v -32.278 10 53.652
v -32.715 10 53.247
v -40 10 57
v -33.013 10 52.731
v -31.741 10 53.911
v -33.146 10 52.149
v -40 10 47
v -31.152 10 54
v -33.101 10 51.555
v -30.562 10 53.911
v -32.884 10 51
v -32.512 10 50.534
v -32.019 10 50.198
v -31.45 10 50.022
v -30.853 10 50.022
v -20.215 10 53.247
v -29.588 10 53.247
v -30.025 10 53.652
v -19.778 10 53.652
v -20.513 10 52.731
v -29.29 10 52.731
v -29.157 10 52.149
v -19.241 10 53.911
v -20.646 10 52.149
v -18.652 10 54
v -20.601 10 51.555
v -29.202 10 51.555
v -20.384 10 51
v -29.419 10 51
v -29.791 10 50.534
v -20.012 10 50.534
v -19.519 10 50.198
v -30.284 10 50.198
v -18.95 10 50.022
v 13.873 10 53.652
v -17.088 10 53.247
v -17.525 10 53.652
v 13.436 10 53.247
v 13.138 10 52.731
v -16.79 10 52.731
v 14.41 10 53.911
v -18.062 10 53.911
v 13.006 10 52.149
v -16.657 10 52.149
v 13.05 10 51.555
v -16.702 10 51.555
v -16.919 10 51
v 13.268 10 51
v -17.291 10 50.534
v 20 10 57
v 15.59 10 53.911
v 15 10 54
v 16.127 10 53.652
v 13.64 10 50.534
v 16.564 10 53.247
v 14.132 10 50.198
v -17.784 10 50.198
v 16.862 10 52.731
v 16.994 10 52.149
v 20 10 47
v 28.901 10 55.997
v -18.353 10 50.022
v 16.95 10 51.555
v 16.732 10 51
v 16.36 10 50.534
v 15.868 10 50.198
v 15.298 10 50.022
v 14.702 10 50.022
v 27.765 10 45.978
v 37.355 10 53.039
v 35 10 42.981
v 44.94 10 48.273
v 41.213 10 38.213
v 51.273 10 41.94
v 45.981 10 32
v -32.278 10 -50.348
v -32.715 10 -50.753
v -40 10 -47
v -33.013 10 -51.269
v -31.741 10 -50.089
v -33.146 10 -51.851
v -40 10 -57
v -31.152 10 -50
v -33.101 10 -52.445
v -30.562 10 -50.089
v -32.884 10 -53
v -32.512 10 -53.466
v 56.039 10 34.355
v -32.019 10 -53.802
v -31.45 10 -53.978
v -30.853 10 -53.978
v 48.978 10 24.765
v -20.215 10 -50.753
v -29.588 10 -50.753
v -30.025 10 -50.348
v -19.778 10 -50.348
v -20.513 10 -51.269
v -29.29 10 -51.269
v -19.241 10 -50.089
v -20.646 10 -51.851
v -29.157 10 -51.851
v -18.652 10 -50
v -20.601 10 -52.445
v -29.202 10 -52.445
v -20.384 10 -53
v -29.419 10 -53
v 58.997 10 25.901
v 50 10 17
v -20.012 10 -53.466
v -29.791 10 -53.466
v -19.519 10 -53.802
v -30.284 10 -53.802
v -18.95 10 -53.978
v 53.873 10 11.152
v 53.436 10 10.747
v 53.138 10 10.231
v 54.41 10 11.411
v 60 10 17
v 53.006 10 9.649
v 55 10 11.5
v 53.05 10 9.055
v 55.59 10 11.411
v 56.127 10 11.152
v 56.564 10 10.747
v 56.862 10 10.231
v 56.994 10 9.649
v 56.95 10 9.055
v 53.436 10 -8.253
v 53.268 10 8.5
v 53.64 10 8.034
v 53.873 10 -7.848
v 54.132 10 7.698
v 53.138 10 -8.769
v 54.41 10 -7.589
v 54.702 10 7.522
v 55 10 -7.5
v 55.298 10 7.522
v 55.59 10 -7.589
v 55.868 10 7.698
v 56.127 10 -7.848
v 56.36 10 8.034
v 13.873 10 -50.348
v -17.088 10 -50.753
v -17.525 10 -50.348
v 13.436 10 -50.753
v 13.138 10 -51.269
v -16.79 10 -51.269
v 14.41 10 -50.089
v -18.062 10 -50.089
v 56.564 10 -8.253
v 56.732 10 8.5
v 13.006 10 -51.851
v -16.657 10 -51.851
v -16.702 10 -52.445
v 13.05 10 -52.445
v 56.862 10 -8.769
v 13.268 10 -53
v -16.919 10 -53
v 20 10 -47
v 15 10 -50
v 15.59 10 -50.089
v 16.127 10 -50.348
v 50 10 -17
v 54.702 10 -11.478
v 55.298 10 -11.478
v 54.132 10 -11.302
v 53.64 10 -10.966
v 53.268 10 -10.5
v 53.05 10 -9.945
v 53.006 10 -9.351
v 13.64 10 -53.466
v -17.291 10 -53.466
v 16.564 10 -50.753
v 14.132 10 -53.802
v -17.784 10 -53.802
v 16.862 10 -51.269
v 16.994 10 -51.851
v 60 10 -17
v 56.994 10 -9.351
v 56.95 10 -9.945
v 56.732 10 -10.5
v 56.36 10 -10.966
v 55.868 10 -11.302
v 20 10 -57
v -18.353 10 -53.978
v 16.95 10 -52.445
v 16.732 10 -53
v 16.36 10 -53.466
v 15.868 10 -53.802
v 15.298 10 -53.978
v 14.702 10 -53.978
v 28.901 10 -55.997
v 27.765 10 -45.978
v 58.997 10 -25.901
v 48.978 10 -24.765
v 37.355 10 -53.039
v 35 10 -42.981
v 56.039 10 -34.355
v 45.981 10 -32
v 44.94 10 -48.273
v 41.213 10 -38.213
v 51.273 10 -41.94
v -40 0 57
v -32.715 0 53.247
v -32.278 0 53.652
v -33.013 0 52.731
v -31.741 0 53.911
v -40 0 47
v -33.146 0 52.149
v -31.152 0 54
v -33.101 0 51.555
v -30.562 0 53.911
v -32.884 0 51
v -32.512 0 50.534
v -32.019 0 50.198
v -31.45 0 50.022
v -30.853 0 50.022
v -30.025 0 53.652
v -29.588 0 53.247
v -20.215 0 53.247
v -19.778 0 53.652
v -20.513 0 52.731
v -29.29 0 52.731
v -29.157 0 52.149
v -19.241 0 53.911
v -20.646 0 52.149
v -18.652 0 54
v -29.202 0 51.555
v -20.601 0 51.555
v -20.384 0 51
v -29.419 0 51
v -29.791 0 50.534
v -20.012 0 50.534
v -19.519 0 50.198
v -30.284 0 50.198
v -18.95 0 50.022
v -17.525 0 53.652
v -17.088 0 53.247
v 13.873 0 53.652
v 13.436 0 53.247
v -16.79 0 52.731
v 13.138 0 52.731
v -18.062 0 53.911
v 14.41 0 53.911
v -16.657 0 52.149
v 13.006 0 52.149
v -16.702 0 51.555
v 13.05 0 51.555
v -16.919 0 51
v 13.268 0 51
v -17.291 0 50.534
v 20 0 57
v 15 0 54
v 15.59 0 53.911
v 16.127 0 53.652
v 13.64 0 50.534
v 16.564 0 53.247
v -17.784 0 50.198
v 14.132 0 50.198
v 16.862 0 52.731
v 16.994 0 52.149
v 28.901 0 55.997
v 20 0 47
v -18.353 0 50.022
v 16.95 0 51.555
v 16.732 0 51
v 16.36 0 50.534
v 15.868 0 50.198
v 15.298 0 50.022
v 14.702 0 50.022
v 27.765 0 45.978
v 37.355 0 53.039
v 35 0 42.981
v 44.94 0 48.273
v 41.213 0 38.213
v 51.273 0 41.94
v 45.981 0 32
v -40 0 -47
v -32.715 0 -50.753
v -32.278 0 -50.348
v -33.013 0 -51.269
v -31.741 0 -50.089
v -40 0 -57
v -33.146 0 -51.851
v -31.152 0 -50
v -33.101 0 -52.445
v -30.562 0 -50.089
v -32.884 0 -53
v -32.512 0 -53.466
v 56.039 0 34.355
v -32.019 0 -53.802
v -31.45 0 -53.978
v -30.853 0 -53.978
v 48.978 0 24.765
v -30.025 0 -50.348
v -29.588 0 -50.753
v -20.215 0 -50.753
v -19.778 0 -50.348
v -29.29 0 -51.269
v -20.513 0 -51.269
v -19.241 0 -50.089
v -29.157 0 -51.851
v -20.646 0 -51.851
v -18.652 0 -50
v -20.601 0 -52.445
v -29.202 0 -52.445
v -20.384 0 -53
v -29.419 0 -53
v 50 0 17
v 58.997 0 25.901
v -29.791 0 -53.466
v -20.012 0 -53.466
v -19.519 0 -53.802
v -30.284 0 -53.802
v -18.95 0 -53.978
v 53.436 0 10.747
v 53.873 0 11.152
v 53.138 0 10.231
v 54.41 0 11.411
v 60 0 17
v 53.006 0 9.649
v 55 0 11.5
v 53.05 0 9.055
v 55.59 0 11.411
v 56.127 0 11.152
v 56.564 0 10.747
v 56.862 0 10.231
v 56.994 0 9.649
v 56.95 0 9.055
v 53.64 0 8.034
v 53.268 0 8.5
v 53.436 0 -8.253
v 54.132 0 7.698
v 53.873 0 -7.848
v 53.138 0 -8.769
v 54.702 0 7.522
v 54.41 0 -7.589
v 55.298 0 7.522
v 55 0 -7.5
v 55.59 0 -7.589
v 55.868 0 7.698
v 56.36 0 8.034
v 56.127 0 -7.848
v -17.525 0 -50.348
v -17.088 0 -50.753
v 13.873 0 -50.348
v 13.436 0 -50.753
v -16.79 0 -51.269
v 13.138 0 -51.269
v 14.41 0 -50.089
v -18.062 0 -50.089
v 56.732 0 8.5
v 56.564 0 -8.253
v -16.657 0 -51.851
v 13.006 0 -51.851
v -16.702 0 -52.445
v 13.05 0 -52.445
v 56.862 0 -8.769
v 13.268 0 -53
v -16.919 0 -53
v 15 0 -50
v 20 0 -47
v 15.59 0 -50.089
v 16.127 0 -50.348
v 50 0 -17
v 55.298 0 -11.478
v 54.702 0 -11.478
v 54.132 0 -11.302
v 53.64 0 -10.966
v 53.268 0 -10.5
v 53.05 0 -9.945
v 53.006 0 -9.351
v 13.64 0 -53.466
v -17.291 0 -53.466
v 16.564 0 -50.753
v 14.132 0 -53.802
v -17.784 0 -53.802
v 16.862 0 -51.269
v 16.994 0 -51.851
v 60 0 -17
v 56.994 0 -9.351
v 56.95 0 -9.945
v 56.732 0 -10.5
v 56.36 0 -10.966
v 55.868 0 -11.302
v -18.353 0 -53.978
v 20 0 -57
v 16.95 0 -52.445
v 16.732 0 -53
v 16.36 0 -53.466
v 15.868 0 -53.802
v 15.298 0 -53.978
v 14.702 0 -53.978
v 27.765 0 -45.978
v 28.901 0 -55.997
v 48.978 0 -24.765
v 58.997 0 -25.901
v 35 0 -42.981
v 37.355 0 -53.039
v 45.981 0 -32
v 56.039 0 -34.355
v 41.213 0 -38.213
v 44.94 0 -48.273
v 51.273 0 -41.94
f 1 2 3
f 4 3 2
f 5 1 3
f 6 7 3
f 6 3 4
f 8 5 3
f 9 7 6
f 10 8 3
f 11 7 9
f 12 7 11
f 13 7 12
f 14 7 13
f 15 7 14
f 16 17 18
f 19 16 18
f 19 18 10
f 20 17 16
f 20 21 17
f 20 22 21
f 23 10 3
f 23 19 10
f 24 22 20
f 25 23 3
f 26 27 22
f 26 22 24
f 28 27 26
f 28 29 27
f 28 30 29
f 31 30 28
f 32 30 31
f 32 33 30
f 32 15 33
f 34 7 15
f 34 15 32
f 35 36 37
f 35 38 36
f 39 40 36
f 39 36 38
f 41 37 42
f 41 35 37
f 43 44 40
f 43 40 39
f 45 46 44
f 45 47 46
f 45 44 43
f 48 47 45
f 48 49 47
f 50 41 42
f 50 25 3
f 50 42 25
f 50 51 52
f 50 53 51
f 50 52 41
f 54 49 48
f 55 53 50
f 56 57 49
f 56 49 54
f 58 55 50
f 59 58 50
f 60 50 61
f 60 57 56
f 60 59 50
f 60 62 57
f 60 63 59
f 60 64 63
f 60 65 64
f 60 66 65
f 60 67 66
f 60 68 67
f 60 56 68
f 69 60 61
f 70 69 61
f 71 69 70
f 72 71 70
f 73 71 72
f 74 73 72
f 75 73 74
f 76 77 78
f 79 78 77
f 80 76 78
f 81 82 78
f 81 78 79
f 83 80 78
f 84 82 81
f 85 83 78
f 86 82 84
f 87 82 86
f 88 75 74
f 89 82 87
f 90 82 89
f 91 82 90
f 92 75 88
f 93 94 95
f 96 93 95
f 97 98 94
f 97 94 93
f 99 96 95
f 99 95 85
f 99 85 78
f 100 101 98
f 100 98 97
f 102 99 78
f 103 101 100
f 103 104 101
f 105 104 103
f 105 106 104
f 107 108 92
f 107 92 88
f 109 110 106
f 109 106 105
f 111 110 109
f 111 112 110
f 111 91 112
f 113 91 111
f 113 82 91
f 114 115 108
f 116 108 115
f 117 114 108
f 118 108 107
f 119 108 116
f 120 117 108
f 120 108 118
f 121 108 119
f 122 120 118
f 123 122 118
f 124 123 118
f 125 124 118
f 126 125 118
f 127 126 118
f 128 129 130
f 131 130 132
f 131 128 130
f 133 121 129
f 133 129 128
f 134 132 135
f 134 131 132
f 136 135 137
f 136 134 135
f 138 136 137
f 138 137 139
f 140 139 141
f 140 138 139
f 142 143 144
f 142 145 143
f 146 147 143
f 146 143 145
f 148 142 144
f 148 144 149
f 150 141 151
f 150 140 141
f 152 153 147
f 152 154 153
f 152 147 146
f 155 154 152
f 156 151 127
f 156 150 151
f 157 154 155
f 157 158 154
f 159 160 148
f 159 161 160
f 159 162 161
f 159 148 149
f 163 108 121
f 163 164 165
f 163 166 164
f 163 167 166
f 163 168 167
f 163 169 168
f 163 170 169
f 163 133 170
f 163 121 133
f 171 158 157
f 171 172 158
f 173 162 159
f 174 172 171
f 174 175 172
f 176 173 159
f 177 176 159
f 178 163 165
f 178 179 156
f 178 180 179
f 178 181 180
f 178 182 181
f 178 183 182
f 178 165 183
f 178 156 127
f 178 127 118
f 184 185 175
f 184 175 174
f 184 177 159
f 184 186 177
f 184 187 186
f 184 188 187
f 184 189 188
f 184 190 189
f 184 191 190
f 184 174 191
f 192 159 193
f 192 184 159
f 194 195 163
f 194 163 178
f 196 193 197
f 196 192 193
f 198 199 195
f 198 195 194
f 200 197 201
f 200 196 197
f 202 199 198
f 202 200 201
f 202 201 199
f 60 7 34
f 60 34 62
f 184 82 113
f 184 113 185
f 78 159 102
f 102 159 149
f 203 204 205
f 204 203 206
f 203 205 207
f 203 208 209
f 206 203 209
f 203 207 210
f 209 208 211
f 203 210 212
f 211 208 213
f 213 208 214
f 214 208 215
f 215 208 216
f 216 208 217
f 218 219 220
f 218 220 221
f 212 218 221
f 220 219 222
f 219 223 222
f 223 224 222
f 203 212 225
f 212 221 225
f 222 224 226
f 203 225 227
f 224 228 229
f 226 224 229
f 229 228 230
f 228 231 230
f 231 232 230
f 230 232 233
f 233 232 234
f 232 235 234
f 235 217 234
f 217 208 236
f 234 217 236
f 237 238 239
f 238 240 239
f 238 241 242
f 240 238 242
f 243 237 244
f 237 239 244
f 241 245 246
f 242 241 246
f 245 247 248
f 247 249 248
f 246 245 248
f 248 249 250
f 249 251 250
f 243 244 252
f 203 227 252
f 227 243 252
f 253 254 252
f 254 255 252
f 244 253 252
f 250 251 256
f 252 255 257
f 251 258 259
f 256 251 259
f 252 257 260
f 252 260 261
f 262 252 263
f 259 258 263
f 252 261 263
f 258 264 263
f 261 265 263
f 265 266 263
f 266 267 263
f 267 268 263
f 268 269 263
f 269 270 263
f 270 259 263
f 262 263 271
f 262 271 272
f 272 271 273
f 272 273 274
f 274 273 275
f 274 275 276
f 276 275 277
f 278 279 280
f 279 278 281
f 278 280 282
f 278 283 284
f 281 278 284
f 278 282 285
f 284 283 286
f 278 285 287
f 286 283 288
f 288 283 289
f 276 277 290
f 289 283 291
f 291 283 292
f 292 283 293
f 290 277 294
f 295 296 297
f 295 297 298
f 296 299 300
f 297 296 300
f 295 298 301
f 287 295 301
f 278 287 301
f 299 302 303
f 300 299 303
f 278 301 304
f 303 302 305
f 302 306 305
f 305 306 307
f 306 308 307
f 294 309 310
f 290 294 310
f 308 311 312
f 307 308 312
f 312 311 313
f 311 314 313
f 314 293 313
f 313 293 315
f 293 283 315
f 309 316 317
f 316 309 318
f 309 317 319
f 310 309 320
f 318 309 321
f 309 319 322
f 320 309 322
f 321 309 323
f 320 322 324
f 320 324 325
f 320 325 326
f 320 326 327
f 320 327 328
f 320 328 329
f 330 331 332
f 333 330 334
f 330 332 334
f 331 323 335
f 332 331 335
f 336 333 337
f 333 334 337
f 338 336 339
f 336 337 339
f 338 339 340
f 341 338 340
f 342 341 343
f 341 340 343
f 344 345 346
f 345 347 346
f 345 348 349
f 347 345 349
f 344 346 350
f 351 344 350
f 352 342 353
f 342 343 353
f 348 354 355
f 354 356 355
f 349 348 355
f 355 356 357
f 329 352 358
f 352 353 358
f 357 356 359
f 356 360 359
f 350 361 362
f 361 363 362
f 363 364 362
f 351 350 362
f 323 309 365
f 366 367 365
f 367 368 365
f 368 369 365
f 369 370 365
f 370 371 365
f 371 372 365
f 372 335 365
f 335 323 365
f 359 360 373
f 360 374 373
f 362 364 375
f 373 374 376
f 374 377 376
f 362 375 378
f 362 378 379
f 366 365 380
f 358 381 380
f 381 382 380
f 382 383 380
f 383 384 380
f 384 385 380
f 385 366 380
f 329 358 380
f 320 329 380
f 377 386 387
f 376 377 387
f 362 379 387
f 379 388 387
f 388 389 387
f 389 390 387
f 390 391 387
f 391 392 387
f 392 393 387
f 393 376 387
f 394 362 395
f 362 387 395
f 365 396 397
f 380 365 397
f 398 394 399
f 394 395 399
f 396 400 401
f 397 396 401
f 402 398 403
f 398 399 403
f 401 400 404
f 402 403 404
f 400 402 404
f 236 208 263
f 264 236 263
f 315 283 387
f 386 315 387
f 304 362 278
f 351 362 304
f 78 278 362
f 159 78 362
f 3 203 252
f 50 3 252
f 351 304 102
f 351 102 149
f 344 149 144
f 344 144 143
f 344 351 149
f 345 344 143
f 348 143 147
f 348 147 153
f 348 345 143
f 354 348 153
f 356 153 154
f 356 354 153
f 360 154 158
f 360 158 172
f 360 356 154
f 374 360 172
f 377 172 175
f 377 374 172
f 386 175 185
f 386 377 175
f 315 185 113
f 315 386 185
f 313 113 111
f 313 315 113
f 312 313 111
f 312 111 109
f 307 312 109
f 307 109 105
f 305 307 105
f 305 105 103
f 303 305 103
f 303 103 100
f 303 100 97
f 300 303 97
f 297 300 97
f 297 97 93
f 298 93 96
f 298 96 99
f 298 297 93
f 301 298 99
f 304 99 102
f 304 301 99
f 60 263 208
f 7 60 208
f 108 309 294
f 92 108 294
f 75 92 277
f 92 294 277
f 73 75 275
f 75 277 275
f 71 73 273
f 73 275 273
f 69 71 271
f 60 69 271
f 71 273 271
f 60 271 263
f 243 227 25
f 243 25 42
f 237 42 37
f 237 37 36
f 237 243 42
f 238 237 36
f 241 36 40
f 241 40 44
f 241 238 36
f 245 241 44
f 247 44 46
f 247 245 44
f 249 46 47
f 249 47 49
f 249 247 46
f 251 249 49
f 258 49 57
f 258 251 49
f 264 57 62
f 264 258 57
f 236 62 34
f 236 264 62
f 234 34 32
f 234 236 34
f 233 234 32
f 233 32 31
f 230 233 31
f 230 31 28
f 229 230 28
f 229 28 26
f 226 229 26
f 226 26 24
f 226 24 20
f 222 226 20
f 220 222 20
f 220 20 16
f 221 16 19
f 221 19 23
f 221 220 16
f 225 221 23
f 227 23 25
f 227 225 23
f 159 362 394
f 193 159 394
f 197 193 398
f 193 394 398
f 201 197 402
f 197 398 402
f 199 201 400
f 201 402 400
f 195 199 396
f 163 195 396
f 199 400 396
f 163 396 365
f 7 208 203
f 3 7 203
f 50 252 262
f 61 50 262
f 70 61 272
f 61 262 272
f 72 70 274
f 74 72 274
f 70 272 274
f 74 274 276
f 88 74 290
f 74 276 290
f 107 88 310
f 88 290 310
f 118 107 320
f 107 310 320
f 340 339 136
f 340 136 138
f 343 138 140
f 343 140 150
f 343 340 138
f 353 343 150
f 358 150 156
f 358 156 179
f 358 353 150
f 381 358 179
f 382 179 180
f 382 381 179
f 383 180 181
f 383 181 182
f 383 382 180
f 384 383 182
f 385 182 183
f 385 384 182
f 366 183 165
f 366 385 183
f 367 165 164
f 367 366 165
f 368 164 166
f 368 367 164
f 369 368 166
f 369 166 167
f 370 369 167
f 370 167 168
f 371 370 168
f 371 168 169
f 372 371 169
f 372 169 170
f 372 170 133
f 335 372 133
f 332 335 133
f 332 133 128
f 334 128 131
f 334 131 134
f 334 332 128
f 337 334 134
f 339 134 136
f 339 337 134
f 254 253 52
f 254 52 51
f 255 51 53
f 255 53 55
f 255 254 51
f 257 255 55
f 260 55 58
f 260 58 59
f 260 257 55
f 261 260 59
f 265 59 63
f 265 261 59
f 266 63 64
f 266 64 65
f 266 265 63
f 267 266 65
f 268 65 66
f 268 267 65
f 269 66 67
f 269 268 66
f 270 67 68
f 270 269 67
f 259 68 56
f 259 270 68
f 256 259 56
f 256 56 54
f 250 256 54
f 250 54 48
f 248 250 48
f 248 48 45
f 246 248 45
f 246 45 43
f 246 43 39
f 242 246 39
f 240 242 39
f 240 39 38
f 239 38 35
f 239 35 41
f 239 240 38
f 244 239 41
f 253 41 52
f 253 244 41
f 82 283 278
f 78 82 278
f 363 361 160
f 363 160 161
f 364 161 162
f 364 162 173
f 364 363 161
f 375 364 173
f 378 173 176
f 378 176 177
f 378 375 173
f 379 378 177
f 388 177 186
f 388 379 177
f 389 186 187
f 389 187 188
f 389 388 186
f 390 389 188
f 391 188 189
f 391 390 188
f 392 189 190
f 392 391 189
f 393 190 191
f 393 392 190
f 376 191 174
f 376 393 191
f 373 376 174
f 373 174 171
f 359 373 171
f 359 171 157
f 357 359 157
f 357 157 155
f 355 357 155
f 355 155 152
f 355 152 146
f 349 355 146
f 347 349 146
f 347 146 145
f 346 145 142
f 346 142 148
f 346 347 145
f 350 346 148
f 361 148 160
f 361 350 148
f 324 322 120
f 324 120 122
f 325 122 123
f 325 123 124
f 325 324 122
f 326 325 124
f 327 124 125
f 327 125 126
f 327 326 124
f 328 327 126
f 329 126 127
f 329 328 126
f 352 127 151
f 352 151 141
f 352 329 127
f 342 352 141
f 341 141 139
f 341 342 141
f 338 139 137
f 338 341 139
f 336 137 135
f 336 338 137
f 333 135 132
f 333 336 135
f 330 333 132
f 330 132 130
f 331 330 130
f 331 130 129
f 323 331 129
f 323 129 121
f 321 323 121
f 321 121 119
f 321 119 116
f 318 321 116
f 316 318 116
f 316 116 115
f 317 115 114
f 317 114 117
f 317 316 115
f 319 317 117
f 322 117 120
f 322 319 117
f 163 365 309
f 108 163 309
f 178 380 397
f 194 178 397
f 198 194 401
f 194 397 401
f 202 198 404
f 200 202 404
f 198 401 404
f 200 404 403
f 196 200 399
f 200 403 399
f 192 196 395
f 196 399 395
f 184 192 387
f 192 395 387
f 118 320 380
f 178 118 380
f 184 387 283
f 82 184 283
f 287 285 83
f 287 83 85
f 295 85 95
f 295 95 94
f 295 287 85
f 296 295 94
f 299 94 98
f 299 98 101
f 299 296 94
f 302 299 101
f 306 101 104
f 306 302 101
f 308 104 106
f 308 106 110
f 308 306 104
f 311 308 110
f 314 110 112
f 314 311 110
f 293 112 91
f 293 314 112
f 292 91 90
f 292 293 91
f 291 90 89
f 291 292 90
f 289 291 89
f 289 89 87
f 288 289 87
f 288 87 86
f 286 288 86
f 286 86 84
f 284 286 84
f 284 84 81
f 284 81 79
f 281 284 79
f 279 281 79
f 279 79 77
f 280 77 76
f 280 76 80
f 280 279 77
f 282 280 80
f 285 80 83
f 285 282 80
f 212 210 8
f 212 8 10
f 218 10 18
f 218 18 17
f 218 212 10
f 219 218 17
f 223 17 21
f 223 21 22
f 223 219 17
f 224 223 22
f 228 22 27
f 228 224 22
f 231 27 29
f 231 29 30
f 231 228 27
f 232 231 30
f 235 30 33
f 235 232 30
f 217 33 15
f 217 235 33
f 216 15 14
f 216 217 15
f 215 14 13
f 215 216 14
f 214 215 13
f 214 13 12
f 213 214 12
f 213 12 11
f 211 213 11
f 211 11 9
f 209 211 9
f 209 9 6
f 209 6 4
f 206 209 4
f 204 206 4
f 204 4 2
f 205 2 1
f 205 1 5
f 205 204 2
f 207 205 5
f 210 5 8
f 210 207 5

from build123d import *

# Parameters (mm, degrees)
SKETCH1_R           = 2
BOSS_EXTRUDE1_DEPTH = 10


with BuildPart() as part:
    # Sketch1 → Boss-Extrude1 (new body)
    with BuildSketch(Plane(origin=(0, 0, 0), x_dir=(1, 0, 0), z_dir=(0, 1, 0))):
        with BuildLine():
            Line((20, -47), (-40, -47))
            Line((-40, -47), (-40, -57))
            Line((-40, -57), (20, -57))
            ThreePointArc((20, -57), (48.284271247, -45.284271247), (60, -17))
            Line((60, -17), (60, 17))
            ThreePointArc((60, 17), (48.284271247, 45.284271247), (20, 57))
            Line((20, 57), (-40, 57))
            Line((-40, 57), (-40, 47))
            Line((-40, 47), (20, 47))
            ThreePointArc((20, 47), (41.213203436, 38.213203436), (50, 17))
            Line((50, 17), (50, -17))
            ThreePointArc((50, -17), (41.213203436, -38.213203436), (20, -47))
        make_face()
        with Locations(Location((55, 9.5, 0), (0, 0, 270))):
            Circle(SKETCH1_R, mode=Mode.SUBTRACT)
        with Locations(Location((55, -9.5, 0), (0, 0, 270))):
            Circle(SKETCH1_R, mode=Mode.SUBTRACT)
        with Locations(Location((15, 52, 0), (0, 0, 270))):
            Circle(SKETCH1_R, mode=Mode.SUBTRACT)
        with Locations(Location((15, -52, 0), (0, 0, 270))):
            Circle(SKETCH1_R, mode=Mode.SUBTRACT)
        with Locations(Location((-18.651513194, 52, 0), (0, 0, 270))):
            Circle(SKETCH1_R, mode=Mode.SUBTRACT)
        with Locations(Location((-31.151513194, 52, 0), (0, 0, 270))):
            Circle(SKETCH1_R, mode=Mode.SUBTRACT)
        with Locations(Location((-18.651513194, -52, 0), (0, 0, 270))):
            Circle(SKETCH1_R, mode=Mode.SUBTRACT)
        with Locations(Location((-31.151513194, -52, 0), (0, 0, 270))):
            Circle(SKETCH1_R, mode=Mode.SUBTRACT)
    extrude(amount=BOSS_EXTRUDE1_DEPTH)


solid = part.part
